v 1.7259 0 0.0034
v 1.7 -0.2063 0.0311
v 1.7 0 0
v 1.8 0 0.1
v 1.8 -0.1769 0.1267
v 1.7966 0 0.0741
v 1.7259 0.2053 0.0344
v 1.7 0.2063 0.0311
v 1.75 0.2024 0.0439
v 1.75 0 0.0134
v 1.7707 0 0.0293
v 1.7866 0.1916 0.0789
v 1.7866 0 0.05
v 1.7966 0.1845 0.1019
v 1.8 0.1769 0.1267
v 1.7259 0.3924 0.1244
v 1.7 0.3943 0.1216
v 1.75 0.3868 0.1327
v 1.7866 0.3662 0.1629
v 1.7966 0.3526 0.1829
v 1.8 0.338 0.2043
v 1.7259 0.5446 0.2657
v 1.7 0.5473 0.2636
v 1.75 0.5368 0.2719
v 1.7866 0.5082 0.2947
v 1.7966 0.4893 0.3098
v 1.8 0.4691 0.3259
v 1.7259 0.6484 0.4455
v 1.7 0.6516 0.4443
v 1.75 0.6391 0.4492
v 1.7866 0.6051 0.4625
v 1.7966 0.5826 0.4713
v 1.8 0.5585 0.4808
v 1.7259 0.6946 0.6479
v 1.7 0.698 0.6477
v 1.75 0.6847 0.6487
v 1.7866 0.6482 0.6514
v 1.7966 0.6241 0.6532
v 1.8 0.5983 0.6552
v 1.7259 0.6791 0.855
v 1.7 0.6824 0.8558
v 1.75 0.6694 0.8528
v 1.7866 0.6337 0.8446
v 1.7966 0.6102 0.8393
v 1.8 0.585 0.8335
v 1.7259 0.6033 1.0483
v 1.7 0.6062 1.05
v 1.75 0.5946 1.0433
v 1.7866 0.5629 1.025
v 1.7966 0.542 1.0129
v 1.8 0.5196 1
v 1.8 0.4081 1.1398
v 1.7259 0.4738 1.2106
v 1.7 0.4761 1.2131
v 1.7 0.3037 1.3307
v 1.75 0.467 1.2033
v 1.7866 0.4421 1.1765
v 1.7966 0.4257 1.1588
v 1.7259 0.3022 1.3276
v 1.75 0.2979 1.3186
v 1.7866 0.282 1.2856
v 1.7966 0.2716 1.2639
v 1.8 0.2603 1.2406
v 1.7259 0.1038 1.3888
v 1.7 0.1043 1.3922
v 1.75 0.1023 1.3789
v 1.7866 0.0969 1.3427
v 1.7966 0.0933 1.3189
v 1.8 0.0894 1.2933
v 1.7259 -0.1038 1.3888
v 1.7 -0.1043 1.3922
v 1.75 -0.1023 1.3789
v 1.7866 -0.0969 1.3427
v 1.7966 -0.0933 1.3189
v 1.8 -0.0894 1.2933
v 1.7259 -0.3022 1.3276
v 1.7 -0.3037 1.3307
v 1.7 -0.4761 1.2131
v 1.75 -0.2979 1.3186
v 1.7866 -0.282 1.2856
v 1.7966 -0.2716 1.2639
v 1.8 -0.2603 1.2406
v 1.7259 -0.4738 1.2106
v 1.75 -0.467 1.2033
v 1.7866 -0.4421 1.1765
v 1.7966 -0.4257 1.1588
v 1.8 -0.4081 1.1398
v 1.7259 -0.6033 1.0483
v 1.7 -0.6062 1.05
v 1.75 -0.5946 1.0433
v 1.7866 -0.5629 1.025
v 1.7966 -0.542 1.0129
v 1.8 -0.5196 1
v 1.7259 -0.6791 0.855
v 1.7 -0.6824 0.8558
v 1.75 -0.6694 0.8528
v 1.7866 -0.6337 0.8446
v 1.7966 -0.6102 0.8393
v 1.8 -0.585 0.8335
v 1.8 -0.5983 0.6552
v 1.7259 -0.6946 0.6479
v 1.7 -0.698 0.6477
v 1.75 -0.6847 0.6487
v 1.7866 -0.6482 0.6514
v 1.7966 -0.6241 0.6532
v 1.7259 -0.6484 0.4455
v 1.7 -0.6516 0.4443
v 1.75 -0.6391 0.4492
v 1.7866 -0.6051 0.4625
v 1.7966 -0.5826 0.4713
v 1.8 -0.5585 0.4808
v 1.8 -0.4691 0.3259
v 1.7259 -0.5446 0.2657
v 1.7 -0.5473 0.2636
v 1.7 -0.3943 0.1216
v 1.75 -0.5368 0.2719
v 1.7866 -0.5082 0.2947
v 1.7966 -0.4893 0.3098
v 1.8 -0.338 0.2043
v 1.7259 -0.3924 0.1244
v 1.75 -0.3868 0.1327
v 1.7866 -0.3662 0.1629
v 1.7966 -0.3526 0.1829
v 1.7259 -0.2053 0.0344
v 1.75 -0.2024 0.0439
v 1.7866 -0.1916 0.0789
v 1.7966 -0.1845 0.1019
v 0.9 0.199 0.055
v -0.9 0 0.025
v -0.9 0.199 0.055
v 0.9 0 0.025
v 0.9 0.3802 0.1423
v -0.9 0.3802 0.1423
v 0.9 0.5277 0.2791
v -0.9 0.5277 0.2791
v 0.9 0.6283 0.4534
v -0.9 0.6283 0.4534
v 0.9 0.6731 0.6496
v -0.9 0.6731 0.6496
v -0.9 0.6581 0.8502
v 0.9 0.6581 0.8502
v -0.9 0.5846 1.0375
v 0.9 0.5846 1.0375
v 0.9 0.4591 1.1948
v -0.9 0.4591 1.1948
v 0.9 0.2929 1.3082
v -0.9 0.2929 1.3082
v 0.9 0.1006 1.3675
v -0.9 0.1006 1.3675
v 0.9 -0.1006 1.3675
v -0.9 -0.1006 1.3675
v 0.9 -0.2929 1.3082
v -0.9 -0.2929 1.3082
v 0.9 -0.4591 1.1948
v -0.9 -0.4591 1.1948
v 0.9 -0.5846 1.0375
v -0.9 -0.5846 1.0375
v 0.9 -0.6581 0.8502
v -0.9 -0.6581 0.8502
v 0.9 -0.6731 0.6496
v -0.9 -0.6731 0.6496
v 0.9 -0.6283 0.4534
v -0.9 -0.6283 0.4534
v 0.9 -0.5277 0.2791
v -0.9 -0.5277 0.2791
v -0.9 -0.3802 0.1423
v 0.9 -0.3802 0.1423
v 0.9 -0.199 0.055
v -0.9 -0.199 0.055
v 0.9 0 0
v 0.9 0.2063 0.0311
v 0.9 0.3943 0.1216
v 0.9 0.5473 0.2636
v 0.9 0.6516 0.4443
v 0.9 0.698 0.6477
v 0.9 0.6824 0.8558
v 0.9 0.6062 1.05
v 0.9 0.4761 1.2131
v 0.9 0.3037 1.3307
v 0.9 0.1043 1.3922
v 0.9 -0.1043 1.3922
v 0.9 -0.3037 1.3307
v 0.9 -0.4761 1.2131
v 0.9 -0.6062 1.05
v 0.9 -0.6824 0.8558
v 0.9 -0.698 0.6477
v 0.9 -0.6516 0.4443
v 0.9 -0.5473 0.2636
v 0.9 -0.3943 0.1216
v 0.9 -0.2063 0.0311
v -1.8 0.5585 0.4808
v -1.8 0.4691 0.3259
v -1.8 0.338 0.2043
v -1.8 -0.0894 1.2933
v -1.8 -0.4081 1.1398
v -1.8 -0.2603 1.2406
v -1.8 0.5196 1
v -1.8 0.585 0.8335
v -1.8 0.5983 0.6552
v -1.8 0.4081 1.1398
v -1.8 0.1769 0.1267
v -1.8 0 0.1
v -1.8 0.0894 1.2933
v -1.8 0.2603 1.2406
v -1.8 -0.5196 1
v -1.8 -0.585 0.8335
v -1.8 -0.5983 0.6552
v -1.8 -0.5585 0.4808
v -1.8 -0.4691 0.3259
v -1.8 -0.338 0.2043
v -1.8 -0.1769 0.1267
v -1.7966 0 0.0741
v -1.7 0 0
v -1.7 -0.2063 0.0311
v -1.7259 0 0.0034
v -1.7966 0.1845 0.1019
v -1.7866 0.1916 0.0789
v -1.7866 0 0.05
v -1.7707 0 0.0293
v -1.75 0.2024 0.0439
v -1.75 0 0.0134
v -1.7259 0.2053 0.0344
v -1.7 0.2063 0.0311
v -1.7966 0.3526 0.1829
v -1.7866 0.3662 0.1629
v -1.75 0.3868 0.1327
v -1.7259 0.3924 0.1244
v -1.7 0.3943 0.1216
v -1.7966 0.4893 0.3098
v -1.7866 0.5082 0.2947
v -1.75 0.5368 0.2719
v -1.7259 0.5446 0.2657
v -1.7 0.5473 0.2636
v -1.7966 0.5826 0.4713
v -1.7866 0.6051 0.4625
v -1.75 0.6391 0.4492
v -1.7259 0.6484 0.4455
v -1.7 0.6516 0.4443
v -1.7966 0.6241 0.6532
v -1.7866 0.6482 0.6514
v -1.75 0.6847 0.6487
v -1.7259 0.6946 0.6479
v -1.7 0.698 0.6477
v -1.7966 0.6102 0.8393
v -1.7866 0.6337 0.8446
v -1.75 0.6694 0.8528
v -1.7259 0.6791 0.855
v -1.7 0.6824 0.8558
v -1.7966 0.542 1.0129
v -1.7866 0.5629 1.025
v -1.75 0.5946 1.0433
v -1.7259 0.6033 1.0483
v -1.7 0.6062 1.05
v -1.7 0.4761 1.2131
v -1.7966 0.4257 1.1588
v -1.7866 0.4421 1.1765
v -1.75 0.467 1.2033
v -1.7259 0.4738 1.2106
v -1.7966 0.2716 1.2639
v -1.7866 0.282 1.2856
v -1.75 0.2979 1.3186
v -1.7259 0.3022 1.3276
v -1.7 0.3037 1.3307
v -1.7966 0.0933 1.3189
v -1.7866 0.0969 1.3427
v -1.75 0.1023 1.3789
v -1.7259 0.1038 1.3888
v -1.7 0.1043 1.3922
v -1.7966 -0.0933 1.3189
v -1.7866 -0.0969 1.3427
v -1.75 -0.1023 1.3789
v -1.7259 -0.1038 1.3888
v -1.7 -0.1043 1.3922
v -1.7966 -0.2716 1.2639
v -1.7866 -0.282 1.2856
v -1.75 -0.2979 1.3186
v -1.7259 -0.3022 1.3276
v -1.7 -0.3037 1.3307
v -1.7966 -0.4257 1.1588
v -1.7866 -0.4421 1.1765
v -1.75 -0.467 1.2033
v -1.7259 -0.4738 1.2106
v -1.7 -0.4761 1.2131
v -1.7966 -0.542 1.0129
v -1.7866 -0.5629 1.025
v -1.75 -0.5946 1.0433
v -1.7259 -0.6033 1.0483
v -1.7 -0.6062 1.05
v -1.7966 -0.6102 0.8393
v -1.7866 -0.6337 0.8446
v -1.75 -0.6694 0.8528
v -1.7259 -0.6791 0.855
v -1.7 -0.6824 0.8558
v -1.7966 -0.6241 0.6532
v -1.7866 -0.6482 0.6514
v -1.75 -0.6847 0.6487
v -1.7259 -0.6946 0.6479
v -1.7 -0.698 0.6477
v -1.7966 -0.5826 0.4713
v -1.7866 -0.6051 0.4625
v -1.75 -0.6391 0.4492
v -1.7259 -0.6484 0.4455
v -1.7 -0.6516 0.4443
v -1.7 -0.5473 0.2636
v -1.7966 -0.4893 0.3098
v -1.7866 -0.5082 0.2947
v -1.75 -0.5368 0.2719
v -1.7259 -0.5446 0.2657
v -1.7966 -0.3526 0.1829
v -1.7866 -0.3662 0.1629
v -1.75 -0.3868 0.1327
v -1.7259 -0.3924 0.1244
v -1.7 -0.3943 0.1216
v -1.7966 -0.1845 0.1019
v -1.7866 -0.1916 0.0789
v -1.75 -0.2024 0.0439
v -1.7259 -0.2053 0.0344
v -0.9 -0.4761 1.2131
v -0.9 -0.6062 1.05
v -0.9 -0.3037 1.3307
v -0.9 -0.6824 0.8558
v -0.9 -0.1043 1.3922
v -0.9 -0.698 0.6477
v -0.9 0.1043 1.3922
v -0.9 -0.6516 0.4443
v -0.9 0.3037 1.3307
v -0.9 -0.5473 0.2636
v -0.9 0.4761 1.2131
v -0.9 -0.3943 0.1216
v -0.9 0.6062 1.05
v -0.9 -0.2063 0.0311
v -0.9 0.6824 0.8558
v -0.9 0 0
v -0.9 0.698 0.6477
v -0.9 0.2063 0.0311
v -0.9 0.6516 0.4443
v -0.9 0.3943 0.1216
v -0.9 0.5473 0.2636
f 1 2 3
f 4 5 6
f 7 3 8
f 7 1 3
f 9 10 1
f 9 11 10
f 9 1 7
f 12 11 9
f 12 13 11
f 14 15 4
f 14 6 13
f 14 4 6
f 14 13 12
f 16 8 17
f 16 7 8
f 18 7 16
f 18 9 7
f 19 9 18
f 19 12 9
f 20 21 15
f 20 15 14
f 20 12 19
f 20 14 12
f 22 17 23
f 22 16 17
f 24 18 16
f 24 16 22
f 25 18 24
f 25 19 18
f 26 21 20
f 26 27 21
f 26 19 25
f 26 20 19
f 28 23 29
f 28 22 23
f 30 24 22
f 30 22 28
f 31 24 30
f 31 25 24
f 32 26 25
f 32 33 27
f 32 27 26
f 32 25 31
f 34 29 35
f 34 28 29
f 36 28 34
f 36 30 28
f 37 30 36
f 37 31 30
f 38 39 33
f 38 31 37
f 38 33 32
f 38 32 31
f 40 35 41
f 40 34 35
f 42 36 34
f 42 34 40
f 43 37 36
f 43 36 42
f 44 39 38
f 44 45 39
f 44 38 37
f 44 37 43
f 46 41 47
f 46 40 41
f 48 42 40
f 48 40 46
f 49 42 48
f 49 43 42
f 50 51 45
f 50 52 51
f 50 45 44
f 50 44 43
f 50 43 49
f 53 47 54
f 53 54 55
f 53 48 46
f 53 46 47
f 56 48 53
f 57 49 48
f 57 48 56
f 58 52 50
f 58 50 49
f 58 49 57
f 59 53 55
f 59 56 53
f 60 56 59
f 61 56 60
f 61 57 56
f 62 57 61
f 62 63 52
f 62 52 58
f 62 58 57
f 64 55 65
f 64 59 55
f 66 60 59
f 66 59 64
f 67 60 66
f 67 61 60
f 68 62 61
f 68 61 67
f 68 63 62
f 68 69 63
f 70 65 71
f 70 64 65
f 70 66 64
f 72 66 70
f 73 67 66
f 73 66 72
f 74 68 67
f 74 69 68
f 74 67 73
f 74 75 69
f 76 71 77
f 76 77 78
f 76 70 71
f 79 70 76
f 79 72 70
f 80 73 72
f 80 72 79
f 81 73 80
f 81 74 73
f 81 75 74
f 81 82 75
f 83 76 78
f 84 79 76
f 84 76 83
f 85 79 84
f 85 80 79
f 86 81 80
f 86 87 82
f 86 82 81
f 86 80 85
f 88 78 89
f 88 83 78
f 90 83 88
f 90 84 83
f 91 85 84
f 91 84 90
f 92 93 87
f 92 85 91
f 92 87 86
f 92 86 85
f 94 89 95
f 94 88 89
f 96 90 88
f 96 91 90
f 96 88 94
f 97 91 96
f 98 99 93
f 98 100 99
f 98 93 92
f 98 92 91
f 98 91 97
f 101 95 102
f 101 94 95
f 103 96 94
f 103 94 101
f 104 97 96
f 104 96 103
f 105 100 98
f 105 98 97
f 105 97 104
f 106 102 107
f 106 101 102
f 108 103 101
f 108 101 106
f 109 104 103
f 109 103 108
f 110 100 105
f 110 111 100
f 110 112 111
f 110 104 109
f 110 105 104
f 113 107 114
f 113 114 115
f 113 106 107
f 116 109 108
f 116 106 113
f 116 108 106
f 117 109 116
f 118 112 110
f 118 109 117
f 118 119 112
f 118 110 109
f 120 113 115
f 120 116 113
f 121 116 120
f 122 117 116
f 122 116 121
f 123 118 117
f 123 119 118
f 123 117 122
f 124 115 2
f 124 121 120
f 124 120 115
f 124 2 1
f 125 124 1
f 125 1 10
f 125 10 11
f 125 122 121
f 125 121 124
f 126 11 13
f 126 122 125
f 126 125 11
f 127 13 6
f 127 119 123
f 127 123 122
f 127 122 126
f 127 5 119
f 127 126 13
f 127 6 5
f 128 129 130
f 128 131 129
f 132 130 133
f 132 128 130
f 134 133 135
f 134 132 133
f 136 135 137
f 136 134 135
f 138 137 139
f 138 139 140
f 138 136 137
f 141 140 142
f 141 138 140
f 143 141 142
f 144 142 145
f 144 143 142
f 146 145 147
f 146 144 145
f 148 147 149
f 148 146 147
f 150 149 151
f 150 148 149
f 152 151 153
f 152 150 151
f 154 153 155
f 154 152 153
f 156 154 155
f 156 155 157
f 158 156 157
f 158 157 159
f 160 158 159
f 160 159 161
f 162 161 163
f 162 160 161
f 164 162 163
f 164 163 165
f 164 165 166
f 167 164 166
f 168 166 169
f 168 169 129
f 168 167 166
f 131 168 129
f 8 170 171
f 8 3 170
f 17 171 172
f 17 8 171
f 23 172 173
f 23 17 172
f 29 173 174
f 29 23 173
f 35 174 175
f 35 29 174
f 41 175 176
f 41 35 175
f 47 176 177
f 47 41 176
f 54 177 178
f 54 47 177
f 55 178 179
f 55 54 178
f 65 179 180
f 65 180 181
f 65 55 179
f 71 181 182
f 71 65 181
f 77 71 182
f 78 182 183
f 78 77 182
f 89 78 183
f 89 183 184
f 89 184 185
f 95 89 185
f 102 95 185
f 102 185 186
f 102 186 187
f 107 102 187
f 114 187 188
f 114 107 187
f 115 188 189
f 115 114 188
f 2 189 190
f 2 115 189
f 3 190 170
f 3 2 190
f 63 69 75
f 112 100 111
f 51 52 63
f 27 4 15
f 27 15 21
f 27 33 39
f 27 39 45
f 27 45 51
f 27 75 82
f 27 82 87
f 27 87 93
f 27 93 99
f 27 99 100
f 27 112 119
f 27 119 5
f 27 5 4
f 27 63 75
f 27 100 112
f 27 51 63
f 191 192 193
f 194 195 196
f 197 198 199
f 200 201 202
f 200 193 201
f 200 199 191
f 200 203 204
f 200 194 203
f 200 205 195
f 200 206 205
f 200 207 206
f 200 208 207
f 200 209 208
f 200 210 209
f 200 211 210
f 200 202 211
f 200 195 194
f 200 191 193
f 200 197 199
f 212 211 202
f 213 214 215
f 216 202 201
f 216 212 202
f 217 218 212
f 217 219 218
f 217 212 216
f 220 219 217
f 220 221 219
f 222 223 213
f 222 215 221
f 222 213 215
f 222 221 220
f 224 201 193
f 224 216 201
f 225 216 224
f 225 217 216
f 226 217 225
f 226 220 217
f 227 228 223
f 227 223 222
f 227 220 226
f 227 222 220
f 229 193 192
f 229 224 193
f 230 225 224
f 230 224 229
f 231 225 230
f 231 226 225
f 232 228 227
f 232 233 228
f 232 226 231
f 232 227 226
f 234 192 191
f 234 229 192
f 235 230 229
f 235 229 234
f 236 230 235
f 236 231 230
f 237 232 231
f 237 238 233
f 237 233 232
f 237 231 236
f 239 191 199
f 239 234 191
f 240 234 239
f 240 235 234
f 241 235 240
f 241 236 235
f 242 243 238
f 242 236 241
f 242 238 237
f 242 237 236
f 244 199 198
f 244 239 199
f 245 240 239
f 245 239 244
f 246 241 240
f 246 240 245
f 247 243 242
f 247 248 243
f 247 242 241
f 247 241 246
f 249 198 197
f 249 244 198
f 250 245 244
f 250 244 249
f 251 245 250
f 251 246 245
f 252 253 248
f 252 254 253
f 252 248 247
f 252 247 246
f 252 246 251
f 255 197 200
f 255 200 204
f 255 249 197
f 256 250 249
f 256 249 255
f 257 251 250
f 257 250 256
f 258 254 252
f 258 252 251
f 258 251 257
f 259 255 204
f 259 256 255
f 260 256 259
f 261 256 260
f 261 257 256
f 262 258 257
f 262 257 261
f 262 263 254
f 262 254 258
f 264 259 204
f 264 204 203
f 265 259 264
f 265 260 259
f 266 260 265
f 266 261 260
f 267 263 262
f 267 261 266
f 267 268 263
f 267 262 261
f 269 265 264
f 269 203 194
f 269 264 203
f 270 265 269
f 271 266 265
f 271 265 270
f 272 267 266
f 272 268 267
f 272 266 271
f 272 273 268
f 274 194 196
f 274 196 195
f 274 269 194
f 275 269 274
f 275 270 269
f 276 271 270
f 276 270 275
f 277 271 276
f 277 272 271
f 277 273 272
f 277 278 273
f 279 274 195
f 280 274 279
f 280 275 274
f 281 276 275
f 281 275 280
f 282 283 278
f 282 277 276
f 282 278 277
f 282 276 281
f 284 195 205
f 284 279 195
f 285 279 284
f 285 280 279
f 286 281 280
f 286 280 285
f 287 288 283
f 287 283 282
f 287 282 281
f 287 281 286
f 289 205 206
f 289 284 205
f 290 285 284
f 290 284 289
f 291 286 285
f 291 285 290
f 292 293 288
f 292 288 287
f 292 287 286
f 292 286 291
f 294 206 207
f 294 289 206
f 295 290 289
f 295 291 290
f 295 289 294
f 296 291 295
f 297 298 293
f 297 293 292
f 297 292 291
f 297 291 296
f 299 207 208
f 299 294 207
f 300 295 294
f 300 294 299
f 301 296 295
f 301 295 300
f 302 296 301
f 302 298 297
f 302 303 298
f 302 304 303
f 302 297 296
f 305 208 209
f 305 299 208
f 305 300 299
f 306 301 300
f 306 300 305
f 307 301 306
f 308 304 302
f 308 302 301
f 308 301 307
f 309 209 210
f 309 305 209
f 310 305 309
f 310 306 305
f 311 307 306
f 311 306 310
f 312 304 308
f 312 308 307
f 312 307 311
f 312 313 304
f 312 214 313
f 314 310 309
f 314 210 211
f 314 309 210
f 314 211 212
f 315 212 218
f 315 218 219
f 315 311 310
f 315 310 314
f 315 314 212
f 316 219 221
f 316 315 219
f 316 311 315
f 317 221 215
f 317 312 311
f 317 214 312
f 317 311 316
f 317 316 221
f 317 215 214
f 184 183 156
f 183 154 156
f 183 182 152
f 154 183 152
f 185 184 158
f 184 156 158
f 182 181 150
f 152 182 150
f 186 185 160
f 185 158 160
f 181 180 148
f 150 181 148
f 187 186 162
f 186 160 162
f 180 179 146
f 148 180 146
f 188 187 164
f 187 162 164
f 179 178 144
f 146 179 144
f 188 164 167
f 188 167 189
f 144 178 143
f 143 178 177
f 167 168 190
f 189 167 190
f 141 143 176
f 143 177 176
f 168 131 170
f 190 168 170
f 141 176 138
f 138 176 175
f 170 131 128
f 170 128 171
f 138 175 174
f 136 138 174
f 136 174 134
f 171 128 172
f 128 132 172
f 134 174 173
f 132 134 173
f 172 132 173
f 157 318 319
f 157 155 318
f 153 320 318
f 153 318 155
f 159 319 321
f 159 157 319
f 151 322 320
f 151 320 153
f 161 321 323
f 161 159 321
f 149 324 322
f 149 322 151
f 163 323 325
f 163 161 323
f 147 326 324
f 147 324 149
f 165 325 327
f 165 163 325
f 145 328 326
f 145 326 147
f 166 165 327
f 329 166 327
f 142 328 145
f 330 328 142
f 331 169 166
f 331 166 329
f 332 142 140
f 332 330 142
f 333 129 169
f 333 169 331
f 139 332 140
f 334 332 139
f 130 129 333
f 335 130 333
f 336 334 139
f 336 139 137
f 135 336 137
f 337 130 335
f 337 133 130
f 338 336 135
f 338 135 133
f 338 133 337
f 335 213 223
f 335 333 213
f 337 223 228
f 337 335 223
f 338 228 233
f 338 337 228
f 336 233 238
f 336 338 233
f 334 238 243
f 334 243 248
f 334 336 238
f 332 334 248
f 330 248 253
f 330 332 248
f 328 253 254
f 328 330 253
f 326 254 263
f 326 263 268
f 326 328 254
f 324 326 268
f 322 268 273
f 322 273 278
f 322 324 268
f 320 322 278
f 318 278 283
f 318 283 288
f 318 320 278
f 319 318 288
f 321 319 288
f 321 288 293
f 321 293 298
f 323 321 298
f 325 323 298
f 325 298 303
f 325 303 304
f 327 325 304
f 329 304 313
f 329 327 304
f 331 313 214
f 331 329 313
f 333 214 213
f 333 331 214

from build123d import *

# Parameters (mm, degrees)
SKETCH_W = 2.7
SKETCH_H = 0.675


with BuildPart() as revolution:
    # Sketch → Revolution (revolve)
    with BuildSketch(Plane.XZ):
        with Locations((0, 0.3625)):
            Rectangle(SKETCH_W, SKETCH_H)
    revolve(axis=Axis((-15.061842, 0, 0.7), (1, 0, 0)))


with BuildPart() as fusion:
    # Sketch001 → Revolution001 (revolve)
    with BuildSketch(Plane.XZ):
        with BuildLine():
            Line((-1.7, 0), (-0.9, 0))
            Line((-0.9, 0), (-0.9, 0.6))
            Line((-0.9, 0.6), (0.9, 0.6))
            Line((0.9, 0), (0.9, 0.6))
            Line((0.9, 0), (1.7, 0))
            ThreePointArc((1.7, 0), (1.770711, 0.029289), (1.8, 0.1))
            Line((1.8, 0.1), (1.8, 0.7))
            Line((-1.8, 0.7), (1.8, 0.7))
            Line((-1.8, 0.7), (-1.8, 0.1))
            ThreePointArc((-1.8, 0.1), (-1.770711, 0.029289), (-1.7, 0))
        make_face()
    revolve(axis=Axis((-8.2, 0, 0.7), (1, 0, 0)))

    # Fusion: union Revolution
    add(revolution.part)


solid = fusion.part
